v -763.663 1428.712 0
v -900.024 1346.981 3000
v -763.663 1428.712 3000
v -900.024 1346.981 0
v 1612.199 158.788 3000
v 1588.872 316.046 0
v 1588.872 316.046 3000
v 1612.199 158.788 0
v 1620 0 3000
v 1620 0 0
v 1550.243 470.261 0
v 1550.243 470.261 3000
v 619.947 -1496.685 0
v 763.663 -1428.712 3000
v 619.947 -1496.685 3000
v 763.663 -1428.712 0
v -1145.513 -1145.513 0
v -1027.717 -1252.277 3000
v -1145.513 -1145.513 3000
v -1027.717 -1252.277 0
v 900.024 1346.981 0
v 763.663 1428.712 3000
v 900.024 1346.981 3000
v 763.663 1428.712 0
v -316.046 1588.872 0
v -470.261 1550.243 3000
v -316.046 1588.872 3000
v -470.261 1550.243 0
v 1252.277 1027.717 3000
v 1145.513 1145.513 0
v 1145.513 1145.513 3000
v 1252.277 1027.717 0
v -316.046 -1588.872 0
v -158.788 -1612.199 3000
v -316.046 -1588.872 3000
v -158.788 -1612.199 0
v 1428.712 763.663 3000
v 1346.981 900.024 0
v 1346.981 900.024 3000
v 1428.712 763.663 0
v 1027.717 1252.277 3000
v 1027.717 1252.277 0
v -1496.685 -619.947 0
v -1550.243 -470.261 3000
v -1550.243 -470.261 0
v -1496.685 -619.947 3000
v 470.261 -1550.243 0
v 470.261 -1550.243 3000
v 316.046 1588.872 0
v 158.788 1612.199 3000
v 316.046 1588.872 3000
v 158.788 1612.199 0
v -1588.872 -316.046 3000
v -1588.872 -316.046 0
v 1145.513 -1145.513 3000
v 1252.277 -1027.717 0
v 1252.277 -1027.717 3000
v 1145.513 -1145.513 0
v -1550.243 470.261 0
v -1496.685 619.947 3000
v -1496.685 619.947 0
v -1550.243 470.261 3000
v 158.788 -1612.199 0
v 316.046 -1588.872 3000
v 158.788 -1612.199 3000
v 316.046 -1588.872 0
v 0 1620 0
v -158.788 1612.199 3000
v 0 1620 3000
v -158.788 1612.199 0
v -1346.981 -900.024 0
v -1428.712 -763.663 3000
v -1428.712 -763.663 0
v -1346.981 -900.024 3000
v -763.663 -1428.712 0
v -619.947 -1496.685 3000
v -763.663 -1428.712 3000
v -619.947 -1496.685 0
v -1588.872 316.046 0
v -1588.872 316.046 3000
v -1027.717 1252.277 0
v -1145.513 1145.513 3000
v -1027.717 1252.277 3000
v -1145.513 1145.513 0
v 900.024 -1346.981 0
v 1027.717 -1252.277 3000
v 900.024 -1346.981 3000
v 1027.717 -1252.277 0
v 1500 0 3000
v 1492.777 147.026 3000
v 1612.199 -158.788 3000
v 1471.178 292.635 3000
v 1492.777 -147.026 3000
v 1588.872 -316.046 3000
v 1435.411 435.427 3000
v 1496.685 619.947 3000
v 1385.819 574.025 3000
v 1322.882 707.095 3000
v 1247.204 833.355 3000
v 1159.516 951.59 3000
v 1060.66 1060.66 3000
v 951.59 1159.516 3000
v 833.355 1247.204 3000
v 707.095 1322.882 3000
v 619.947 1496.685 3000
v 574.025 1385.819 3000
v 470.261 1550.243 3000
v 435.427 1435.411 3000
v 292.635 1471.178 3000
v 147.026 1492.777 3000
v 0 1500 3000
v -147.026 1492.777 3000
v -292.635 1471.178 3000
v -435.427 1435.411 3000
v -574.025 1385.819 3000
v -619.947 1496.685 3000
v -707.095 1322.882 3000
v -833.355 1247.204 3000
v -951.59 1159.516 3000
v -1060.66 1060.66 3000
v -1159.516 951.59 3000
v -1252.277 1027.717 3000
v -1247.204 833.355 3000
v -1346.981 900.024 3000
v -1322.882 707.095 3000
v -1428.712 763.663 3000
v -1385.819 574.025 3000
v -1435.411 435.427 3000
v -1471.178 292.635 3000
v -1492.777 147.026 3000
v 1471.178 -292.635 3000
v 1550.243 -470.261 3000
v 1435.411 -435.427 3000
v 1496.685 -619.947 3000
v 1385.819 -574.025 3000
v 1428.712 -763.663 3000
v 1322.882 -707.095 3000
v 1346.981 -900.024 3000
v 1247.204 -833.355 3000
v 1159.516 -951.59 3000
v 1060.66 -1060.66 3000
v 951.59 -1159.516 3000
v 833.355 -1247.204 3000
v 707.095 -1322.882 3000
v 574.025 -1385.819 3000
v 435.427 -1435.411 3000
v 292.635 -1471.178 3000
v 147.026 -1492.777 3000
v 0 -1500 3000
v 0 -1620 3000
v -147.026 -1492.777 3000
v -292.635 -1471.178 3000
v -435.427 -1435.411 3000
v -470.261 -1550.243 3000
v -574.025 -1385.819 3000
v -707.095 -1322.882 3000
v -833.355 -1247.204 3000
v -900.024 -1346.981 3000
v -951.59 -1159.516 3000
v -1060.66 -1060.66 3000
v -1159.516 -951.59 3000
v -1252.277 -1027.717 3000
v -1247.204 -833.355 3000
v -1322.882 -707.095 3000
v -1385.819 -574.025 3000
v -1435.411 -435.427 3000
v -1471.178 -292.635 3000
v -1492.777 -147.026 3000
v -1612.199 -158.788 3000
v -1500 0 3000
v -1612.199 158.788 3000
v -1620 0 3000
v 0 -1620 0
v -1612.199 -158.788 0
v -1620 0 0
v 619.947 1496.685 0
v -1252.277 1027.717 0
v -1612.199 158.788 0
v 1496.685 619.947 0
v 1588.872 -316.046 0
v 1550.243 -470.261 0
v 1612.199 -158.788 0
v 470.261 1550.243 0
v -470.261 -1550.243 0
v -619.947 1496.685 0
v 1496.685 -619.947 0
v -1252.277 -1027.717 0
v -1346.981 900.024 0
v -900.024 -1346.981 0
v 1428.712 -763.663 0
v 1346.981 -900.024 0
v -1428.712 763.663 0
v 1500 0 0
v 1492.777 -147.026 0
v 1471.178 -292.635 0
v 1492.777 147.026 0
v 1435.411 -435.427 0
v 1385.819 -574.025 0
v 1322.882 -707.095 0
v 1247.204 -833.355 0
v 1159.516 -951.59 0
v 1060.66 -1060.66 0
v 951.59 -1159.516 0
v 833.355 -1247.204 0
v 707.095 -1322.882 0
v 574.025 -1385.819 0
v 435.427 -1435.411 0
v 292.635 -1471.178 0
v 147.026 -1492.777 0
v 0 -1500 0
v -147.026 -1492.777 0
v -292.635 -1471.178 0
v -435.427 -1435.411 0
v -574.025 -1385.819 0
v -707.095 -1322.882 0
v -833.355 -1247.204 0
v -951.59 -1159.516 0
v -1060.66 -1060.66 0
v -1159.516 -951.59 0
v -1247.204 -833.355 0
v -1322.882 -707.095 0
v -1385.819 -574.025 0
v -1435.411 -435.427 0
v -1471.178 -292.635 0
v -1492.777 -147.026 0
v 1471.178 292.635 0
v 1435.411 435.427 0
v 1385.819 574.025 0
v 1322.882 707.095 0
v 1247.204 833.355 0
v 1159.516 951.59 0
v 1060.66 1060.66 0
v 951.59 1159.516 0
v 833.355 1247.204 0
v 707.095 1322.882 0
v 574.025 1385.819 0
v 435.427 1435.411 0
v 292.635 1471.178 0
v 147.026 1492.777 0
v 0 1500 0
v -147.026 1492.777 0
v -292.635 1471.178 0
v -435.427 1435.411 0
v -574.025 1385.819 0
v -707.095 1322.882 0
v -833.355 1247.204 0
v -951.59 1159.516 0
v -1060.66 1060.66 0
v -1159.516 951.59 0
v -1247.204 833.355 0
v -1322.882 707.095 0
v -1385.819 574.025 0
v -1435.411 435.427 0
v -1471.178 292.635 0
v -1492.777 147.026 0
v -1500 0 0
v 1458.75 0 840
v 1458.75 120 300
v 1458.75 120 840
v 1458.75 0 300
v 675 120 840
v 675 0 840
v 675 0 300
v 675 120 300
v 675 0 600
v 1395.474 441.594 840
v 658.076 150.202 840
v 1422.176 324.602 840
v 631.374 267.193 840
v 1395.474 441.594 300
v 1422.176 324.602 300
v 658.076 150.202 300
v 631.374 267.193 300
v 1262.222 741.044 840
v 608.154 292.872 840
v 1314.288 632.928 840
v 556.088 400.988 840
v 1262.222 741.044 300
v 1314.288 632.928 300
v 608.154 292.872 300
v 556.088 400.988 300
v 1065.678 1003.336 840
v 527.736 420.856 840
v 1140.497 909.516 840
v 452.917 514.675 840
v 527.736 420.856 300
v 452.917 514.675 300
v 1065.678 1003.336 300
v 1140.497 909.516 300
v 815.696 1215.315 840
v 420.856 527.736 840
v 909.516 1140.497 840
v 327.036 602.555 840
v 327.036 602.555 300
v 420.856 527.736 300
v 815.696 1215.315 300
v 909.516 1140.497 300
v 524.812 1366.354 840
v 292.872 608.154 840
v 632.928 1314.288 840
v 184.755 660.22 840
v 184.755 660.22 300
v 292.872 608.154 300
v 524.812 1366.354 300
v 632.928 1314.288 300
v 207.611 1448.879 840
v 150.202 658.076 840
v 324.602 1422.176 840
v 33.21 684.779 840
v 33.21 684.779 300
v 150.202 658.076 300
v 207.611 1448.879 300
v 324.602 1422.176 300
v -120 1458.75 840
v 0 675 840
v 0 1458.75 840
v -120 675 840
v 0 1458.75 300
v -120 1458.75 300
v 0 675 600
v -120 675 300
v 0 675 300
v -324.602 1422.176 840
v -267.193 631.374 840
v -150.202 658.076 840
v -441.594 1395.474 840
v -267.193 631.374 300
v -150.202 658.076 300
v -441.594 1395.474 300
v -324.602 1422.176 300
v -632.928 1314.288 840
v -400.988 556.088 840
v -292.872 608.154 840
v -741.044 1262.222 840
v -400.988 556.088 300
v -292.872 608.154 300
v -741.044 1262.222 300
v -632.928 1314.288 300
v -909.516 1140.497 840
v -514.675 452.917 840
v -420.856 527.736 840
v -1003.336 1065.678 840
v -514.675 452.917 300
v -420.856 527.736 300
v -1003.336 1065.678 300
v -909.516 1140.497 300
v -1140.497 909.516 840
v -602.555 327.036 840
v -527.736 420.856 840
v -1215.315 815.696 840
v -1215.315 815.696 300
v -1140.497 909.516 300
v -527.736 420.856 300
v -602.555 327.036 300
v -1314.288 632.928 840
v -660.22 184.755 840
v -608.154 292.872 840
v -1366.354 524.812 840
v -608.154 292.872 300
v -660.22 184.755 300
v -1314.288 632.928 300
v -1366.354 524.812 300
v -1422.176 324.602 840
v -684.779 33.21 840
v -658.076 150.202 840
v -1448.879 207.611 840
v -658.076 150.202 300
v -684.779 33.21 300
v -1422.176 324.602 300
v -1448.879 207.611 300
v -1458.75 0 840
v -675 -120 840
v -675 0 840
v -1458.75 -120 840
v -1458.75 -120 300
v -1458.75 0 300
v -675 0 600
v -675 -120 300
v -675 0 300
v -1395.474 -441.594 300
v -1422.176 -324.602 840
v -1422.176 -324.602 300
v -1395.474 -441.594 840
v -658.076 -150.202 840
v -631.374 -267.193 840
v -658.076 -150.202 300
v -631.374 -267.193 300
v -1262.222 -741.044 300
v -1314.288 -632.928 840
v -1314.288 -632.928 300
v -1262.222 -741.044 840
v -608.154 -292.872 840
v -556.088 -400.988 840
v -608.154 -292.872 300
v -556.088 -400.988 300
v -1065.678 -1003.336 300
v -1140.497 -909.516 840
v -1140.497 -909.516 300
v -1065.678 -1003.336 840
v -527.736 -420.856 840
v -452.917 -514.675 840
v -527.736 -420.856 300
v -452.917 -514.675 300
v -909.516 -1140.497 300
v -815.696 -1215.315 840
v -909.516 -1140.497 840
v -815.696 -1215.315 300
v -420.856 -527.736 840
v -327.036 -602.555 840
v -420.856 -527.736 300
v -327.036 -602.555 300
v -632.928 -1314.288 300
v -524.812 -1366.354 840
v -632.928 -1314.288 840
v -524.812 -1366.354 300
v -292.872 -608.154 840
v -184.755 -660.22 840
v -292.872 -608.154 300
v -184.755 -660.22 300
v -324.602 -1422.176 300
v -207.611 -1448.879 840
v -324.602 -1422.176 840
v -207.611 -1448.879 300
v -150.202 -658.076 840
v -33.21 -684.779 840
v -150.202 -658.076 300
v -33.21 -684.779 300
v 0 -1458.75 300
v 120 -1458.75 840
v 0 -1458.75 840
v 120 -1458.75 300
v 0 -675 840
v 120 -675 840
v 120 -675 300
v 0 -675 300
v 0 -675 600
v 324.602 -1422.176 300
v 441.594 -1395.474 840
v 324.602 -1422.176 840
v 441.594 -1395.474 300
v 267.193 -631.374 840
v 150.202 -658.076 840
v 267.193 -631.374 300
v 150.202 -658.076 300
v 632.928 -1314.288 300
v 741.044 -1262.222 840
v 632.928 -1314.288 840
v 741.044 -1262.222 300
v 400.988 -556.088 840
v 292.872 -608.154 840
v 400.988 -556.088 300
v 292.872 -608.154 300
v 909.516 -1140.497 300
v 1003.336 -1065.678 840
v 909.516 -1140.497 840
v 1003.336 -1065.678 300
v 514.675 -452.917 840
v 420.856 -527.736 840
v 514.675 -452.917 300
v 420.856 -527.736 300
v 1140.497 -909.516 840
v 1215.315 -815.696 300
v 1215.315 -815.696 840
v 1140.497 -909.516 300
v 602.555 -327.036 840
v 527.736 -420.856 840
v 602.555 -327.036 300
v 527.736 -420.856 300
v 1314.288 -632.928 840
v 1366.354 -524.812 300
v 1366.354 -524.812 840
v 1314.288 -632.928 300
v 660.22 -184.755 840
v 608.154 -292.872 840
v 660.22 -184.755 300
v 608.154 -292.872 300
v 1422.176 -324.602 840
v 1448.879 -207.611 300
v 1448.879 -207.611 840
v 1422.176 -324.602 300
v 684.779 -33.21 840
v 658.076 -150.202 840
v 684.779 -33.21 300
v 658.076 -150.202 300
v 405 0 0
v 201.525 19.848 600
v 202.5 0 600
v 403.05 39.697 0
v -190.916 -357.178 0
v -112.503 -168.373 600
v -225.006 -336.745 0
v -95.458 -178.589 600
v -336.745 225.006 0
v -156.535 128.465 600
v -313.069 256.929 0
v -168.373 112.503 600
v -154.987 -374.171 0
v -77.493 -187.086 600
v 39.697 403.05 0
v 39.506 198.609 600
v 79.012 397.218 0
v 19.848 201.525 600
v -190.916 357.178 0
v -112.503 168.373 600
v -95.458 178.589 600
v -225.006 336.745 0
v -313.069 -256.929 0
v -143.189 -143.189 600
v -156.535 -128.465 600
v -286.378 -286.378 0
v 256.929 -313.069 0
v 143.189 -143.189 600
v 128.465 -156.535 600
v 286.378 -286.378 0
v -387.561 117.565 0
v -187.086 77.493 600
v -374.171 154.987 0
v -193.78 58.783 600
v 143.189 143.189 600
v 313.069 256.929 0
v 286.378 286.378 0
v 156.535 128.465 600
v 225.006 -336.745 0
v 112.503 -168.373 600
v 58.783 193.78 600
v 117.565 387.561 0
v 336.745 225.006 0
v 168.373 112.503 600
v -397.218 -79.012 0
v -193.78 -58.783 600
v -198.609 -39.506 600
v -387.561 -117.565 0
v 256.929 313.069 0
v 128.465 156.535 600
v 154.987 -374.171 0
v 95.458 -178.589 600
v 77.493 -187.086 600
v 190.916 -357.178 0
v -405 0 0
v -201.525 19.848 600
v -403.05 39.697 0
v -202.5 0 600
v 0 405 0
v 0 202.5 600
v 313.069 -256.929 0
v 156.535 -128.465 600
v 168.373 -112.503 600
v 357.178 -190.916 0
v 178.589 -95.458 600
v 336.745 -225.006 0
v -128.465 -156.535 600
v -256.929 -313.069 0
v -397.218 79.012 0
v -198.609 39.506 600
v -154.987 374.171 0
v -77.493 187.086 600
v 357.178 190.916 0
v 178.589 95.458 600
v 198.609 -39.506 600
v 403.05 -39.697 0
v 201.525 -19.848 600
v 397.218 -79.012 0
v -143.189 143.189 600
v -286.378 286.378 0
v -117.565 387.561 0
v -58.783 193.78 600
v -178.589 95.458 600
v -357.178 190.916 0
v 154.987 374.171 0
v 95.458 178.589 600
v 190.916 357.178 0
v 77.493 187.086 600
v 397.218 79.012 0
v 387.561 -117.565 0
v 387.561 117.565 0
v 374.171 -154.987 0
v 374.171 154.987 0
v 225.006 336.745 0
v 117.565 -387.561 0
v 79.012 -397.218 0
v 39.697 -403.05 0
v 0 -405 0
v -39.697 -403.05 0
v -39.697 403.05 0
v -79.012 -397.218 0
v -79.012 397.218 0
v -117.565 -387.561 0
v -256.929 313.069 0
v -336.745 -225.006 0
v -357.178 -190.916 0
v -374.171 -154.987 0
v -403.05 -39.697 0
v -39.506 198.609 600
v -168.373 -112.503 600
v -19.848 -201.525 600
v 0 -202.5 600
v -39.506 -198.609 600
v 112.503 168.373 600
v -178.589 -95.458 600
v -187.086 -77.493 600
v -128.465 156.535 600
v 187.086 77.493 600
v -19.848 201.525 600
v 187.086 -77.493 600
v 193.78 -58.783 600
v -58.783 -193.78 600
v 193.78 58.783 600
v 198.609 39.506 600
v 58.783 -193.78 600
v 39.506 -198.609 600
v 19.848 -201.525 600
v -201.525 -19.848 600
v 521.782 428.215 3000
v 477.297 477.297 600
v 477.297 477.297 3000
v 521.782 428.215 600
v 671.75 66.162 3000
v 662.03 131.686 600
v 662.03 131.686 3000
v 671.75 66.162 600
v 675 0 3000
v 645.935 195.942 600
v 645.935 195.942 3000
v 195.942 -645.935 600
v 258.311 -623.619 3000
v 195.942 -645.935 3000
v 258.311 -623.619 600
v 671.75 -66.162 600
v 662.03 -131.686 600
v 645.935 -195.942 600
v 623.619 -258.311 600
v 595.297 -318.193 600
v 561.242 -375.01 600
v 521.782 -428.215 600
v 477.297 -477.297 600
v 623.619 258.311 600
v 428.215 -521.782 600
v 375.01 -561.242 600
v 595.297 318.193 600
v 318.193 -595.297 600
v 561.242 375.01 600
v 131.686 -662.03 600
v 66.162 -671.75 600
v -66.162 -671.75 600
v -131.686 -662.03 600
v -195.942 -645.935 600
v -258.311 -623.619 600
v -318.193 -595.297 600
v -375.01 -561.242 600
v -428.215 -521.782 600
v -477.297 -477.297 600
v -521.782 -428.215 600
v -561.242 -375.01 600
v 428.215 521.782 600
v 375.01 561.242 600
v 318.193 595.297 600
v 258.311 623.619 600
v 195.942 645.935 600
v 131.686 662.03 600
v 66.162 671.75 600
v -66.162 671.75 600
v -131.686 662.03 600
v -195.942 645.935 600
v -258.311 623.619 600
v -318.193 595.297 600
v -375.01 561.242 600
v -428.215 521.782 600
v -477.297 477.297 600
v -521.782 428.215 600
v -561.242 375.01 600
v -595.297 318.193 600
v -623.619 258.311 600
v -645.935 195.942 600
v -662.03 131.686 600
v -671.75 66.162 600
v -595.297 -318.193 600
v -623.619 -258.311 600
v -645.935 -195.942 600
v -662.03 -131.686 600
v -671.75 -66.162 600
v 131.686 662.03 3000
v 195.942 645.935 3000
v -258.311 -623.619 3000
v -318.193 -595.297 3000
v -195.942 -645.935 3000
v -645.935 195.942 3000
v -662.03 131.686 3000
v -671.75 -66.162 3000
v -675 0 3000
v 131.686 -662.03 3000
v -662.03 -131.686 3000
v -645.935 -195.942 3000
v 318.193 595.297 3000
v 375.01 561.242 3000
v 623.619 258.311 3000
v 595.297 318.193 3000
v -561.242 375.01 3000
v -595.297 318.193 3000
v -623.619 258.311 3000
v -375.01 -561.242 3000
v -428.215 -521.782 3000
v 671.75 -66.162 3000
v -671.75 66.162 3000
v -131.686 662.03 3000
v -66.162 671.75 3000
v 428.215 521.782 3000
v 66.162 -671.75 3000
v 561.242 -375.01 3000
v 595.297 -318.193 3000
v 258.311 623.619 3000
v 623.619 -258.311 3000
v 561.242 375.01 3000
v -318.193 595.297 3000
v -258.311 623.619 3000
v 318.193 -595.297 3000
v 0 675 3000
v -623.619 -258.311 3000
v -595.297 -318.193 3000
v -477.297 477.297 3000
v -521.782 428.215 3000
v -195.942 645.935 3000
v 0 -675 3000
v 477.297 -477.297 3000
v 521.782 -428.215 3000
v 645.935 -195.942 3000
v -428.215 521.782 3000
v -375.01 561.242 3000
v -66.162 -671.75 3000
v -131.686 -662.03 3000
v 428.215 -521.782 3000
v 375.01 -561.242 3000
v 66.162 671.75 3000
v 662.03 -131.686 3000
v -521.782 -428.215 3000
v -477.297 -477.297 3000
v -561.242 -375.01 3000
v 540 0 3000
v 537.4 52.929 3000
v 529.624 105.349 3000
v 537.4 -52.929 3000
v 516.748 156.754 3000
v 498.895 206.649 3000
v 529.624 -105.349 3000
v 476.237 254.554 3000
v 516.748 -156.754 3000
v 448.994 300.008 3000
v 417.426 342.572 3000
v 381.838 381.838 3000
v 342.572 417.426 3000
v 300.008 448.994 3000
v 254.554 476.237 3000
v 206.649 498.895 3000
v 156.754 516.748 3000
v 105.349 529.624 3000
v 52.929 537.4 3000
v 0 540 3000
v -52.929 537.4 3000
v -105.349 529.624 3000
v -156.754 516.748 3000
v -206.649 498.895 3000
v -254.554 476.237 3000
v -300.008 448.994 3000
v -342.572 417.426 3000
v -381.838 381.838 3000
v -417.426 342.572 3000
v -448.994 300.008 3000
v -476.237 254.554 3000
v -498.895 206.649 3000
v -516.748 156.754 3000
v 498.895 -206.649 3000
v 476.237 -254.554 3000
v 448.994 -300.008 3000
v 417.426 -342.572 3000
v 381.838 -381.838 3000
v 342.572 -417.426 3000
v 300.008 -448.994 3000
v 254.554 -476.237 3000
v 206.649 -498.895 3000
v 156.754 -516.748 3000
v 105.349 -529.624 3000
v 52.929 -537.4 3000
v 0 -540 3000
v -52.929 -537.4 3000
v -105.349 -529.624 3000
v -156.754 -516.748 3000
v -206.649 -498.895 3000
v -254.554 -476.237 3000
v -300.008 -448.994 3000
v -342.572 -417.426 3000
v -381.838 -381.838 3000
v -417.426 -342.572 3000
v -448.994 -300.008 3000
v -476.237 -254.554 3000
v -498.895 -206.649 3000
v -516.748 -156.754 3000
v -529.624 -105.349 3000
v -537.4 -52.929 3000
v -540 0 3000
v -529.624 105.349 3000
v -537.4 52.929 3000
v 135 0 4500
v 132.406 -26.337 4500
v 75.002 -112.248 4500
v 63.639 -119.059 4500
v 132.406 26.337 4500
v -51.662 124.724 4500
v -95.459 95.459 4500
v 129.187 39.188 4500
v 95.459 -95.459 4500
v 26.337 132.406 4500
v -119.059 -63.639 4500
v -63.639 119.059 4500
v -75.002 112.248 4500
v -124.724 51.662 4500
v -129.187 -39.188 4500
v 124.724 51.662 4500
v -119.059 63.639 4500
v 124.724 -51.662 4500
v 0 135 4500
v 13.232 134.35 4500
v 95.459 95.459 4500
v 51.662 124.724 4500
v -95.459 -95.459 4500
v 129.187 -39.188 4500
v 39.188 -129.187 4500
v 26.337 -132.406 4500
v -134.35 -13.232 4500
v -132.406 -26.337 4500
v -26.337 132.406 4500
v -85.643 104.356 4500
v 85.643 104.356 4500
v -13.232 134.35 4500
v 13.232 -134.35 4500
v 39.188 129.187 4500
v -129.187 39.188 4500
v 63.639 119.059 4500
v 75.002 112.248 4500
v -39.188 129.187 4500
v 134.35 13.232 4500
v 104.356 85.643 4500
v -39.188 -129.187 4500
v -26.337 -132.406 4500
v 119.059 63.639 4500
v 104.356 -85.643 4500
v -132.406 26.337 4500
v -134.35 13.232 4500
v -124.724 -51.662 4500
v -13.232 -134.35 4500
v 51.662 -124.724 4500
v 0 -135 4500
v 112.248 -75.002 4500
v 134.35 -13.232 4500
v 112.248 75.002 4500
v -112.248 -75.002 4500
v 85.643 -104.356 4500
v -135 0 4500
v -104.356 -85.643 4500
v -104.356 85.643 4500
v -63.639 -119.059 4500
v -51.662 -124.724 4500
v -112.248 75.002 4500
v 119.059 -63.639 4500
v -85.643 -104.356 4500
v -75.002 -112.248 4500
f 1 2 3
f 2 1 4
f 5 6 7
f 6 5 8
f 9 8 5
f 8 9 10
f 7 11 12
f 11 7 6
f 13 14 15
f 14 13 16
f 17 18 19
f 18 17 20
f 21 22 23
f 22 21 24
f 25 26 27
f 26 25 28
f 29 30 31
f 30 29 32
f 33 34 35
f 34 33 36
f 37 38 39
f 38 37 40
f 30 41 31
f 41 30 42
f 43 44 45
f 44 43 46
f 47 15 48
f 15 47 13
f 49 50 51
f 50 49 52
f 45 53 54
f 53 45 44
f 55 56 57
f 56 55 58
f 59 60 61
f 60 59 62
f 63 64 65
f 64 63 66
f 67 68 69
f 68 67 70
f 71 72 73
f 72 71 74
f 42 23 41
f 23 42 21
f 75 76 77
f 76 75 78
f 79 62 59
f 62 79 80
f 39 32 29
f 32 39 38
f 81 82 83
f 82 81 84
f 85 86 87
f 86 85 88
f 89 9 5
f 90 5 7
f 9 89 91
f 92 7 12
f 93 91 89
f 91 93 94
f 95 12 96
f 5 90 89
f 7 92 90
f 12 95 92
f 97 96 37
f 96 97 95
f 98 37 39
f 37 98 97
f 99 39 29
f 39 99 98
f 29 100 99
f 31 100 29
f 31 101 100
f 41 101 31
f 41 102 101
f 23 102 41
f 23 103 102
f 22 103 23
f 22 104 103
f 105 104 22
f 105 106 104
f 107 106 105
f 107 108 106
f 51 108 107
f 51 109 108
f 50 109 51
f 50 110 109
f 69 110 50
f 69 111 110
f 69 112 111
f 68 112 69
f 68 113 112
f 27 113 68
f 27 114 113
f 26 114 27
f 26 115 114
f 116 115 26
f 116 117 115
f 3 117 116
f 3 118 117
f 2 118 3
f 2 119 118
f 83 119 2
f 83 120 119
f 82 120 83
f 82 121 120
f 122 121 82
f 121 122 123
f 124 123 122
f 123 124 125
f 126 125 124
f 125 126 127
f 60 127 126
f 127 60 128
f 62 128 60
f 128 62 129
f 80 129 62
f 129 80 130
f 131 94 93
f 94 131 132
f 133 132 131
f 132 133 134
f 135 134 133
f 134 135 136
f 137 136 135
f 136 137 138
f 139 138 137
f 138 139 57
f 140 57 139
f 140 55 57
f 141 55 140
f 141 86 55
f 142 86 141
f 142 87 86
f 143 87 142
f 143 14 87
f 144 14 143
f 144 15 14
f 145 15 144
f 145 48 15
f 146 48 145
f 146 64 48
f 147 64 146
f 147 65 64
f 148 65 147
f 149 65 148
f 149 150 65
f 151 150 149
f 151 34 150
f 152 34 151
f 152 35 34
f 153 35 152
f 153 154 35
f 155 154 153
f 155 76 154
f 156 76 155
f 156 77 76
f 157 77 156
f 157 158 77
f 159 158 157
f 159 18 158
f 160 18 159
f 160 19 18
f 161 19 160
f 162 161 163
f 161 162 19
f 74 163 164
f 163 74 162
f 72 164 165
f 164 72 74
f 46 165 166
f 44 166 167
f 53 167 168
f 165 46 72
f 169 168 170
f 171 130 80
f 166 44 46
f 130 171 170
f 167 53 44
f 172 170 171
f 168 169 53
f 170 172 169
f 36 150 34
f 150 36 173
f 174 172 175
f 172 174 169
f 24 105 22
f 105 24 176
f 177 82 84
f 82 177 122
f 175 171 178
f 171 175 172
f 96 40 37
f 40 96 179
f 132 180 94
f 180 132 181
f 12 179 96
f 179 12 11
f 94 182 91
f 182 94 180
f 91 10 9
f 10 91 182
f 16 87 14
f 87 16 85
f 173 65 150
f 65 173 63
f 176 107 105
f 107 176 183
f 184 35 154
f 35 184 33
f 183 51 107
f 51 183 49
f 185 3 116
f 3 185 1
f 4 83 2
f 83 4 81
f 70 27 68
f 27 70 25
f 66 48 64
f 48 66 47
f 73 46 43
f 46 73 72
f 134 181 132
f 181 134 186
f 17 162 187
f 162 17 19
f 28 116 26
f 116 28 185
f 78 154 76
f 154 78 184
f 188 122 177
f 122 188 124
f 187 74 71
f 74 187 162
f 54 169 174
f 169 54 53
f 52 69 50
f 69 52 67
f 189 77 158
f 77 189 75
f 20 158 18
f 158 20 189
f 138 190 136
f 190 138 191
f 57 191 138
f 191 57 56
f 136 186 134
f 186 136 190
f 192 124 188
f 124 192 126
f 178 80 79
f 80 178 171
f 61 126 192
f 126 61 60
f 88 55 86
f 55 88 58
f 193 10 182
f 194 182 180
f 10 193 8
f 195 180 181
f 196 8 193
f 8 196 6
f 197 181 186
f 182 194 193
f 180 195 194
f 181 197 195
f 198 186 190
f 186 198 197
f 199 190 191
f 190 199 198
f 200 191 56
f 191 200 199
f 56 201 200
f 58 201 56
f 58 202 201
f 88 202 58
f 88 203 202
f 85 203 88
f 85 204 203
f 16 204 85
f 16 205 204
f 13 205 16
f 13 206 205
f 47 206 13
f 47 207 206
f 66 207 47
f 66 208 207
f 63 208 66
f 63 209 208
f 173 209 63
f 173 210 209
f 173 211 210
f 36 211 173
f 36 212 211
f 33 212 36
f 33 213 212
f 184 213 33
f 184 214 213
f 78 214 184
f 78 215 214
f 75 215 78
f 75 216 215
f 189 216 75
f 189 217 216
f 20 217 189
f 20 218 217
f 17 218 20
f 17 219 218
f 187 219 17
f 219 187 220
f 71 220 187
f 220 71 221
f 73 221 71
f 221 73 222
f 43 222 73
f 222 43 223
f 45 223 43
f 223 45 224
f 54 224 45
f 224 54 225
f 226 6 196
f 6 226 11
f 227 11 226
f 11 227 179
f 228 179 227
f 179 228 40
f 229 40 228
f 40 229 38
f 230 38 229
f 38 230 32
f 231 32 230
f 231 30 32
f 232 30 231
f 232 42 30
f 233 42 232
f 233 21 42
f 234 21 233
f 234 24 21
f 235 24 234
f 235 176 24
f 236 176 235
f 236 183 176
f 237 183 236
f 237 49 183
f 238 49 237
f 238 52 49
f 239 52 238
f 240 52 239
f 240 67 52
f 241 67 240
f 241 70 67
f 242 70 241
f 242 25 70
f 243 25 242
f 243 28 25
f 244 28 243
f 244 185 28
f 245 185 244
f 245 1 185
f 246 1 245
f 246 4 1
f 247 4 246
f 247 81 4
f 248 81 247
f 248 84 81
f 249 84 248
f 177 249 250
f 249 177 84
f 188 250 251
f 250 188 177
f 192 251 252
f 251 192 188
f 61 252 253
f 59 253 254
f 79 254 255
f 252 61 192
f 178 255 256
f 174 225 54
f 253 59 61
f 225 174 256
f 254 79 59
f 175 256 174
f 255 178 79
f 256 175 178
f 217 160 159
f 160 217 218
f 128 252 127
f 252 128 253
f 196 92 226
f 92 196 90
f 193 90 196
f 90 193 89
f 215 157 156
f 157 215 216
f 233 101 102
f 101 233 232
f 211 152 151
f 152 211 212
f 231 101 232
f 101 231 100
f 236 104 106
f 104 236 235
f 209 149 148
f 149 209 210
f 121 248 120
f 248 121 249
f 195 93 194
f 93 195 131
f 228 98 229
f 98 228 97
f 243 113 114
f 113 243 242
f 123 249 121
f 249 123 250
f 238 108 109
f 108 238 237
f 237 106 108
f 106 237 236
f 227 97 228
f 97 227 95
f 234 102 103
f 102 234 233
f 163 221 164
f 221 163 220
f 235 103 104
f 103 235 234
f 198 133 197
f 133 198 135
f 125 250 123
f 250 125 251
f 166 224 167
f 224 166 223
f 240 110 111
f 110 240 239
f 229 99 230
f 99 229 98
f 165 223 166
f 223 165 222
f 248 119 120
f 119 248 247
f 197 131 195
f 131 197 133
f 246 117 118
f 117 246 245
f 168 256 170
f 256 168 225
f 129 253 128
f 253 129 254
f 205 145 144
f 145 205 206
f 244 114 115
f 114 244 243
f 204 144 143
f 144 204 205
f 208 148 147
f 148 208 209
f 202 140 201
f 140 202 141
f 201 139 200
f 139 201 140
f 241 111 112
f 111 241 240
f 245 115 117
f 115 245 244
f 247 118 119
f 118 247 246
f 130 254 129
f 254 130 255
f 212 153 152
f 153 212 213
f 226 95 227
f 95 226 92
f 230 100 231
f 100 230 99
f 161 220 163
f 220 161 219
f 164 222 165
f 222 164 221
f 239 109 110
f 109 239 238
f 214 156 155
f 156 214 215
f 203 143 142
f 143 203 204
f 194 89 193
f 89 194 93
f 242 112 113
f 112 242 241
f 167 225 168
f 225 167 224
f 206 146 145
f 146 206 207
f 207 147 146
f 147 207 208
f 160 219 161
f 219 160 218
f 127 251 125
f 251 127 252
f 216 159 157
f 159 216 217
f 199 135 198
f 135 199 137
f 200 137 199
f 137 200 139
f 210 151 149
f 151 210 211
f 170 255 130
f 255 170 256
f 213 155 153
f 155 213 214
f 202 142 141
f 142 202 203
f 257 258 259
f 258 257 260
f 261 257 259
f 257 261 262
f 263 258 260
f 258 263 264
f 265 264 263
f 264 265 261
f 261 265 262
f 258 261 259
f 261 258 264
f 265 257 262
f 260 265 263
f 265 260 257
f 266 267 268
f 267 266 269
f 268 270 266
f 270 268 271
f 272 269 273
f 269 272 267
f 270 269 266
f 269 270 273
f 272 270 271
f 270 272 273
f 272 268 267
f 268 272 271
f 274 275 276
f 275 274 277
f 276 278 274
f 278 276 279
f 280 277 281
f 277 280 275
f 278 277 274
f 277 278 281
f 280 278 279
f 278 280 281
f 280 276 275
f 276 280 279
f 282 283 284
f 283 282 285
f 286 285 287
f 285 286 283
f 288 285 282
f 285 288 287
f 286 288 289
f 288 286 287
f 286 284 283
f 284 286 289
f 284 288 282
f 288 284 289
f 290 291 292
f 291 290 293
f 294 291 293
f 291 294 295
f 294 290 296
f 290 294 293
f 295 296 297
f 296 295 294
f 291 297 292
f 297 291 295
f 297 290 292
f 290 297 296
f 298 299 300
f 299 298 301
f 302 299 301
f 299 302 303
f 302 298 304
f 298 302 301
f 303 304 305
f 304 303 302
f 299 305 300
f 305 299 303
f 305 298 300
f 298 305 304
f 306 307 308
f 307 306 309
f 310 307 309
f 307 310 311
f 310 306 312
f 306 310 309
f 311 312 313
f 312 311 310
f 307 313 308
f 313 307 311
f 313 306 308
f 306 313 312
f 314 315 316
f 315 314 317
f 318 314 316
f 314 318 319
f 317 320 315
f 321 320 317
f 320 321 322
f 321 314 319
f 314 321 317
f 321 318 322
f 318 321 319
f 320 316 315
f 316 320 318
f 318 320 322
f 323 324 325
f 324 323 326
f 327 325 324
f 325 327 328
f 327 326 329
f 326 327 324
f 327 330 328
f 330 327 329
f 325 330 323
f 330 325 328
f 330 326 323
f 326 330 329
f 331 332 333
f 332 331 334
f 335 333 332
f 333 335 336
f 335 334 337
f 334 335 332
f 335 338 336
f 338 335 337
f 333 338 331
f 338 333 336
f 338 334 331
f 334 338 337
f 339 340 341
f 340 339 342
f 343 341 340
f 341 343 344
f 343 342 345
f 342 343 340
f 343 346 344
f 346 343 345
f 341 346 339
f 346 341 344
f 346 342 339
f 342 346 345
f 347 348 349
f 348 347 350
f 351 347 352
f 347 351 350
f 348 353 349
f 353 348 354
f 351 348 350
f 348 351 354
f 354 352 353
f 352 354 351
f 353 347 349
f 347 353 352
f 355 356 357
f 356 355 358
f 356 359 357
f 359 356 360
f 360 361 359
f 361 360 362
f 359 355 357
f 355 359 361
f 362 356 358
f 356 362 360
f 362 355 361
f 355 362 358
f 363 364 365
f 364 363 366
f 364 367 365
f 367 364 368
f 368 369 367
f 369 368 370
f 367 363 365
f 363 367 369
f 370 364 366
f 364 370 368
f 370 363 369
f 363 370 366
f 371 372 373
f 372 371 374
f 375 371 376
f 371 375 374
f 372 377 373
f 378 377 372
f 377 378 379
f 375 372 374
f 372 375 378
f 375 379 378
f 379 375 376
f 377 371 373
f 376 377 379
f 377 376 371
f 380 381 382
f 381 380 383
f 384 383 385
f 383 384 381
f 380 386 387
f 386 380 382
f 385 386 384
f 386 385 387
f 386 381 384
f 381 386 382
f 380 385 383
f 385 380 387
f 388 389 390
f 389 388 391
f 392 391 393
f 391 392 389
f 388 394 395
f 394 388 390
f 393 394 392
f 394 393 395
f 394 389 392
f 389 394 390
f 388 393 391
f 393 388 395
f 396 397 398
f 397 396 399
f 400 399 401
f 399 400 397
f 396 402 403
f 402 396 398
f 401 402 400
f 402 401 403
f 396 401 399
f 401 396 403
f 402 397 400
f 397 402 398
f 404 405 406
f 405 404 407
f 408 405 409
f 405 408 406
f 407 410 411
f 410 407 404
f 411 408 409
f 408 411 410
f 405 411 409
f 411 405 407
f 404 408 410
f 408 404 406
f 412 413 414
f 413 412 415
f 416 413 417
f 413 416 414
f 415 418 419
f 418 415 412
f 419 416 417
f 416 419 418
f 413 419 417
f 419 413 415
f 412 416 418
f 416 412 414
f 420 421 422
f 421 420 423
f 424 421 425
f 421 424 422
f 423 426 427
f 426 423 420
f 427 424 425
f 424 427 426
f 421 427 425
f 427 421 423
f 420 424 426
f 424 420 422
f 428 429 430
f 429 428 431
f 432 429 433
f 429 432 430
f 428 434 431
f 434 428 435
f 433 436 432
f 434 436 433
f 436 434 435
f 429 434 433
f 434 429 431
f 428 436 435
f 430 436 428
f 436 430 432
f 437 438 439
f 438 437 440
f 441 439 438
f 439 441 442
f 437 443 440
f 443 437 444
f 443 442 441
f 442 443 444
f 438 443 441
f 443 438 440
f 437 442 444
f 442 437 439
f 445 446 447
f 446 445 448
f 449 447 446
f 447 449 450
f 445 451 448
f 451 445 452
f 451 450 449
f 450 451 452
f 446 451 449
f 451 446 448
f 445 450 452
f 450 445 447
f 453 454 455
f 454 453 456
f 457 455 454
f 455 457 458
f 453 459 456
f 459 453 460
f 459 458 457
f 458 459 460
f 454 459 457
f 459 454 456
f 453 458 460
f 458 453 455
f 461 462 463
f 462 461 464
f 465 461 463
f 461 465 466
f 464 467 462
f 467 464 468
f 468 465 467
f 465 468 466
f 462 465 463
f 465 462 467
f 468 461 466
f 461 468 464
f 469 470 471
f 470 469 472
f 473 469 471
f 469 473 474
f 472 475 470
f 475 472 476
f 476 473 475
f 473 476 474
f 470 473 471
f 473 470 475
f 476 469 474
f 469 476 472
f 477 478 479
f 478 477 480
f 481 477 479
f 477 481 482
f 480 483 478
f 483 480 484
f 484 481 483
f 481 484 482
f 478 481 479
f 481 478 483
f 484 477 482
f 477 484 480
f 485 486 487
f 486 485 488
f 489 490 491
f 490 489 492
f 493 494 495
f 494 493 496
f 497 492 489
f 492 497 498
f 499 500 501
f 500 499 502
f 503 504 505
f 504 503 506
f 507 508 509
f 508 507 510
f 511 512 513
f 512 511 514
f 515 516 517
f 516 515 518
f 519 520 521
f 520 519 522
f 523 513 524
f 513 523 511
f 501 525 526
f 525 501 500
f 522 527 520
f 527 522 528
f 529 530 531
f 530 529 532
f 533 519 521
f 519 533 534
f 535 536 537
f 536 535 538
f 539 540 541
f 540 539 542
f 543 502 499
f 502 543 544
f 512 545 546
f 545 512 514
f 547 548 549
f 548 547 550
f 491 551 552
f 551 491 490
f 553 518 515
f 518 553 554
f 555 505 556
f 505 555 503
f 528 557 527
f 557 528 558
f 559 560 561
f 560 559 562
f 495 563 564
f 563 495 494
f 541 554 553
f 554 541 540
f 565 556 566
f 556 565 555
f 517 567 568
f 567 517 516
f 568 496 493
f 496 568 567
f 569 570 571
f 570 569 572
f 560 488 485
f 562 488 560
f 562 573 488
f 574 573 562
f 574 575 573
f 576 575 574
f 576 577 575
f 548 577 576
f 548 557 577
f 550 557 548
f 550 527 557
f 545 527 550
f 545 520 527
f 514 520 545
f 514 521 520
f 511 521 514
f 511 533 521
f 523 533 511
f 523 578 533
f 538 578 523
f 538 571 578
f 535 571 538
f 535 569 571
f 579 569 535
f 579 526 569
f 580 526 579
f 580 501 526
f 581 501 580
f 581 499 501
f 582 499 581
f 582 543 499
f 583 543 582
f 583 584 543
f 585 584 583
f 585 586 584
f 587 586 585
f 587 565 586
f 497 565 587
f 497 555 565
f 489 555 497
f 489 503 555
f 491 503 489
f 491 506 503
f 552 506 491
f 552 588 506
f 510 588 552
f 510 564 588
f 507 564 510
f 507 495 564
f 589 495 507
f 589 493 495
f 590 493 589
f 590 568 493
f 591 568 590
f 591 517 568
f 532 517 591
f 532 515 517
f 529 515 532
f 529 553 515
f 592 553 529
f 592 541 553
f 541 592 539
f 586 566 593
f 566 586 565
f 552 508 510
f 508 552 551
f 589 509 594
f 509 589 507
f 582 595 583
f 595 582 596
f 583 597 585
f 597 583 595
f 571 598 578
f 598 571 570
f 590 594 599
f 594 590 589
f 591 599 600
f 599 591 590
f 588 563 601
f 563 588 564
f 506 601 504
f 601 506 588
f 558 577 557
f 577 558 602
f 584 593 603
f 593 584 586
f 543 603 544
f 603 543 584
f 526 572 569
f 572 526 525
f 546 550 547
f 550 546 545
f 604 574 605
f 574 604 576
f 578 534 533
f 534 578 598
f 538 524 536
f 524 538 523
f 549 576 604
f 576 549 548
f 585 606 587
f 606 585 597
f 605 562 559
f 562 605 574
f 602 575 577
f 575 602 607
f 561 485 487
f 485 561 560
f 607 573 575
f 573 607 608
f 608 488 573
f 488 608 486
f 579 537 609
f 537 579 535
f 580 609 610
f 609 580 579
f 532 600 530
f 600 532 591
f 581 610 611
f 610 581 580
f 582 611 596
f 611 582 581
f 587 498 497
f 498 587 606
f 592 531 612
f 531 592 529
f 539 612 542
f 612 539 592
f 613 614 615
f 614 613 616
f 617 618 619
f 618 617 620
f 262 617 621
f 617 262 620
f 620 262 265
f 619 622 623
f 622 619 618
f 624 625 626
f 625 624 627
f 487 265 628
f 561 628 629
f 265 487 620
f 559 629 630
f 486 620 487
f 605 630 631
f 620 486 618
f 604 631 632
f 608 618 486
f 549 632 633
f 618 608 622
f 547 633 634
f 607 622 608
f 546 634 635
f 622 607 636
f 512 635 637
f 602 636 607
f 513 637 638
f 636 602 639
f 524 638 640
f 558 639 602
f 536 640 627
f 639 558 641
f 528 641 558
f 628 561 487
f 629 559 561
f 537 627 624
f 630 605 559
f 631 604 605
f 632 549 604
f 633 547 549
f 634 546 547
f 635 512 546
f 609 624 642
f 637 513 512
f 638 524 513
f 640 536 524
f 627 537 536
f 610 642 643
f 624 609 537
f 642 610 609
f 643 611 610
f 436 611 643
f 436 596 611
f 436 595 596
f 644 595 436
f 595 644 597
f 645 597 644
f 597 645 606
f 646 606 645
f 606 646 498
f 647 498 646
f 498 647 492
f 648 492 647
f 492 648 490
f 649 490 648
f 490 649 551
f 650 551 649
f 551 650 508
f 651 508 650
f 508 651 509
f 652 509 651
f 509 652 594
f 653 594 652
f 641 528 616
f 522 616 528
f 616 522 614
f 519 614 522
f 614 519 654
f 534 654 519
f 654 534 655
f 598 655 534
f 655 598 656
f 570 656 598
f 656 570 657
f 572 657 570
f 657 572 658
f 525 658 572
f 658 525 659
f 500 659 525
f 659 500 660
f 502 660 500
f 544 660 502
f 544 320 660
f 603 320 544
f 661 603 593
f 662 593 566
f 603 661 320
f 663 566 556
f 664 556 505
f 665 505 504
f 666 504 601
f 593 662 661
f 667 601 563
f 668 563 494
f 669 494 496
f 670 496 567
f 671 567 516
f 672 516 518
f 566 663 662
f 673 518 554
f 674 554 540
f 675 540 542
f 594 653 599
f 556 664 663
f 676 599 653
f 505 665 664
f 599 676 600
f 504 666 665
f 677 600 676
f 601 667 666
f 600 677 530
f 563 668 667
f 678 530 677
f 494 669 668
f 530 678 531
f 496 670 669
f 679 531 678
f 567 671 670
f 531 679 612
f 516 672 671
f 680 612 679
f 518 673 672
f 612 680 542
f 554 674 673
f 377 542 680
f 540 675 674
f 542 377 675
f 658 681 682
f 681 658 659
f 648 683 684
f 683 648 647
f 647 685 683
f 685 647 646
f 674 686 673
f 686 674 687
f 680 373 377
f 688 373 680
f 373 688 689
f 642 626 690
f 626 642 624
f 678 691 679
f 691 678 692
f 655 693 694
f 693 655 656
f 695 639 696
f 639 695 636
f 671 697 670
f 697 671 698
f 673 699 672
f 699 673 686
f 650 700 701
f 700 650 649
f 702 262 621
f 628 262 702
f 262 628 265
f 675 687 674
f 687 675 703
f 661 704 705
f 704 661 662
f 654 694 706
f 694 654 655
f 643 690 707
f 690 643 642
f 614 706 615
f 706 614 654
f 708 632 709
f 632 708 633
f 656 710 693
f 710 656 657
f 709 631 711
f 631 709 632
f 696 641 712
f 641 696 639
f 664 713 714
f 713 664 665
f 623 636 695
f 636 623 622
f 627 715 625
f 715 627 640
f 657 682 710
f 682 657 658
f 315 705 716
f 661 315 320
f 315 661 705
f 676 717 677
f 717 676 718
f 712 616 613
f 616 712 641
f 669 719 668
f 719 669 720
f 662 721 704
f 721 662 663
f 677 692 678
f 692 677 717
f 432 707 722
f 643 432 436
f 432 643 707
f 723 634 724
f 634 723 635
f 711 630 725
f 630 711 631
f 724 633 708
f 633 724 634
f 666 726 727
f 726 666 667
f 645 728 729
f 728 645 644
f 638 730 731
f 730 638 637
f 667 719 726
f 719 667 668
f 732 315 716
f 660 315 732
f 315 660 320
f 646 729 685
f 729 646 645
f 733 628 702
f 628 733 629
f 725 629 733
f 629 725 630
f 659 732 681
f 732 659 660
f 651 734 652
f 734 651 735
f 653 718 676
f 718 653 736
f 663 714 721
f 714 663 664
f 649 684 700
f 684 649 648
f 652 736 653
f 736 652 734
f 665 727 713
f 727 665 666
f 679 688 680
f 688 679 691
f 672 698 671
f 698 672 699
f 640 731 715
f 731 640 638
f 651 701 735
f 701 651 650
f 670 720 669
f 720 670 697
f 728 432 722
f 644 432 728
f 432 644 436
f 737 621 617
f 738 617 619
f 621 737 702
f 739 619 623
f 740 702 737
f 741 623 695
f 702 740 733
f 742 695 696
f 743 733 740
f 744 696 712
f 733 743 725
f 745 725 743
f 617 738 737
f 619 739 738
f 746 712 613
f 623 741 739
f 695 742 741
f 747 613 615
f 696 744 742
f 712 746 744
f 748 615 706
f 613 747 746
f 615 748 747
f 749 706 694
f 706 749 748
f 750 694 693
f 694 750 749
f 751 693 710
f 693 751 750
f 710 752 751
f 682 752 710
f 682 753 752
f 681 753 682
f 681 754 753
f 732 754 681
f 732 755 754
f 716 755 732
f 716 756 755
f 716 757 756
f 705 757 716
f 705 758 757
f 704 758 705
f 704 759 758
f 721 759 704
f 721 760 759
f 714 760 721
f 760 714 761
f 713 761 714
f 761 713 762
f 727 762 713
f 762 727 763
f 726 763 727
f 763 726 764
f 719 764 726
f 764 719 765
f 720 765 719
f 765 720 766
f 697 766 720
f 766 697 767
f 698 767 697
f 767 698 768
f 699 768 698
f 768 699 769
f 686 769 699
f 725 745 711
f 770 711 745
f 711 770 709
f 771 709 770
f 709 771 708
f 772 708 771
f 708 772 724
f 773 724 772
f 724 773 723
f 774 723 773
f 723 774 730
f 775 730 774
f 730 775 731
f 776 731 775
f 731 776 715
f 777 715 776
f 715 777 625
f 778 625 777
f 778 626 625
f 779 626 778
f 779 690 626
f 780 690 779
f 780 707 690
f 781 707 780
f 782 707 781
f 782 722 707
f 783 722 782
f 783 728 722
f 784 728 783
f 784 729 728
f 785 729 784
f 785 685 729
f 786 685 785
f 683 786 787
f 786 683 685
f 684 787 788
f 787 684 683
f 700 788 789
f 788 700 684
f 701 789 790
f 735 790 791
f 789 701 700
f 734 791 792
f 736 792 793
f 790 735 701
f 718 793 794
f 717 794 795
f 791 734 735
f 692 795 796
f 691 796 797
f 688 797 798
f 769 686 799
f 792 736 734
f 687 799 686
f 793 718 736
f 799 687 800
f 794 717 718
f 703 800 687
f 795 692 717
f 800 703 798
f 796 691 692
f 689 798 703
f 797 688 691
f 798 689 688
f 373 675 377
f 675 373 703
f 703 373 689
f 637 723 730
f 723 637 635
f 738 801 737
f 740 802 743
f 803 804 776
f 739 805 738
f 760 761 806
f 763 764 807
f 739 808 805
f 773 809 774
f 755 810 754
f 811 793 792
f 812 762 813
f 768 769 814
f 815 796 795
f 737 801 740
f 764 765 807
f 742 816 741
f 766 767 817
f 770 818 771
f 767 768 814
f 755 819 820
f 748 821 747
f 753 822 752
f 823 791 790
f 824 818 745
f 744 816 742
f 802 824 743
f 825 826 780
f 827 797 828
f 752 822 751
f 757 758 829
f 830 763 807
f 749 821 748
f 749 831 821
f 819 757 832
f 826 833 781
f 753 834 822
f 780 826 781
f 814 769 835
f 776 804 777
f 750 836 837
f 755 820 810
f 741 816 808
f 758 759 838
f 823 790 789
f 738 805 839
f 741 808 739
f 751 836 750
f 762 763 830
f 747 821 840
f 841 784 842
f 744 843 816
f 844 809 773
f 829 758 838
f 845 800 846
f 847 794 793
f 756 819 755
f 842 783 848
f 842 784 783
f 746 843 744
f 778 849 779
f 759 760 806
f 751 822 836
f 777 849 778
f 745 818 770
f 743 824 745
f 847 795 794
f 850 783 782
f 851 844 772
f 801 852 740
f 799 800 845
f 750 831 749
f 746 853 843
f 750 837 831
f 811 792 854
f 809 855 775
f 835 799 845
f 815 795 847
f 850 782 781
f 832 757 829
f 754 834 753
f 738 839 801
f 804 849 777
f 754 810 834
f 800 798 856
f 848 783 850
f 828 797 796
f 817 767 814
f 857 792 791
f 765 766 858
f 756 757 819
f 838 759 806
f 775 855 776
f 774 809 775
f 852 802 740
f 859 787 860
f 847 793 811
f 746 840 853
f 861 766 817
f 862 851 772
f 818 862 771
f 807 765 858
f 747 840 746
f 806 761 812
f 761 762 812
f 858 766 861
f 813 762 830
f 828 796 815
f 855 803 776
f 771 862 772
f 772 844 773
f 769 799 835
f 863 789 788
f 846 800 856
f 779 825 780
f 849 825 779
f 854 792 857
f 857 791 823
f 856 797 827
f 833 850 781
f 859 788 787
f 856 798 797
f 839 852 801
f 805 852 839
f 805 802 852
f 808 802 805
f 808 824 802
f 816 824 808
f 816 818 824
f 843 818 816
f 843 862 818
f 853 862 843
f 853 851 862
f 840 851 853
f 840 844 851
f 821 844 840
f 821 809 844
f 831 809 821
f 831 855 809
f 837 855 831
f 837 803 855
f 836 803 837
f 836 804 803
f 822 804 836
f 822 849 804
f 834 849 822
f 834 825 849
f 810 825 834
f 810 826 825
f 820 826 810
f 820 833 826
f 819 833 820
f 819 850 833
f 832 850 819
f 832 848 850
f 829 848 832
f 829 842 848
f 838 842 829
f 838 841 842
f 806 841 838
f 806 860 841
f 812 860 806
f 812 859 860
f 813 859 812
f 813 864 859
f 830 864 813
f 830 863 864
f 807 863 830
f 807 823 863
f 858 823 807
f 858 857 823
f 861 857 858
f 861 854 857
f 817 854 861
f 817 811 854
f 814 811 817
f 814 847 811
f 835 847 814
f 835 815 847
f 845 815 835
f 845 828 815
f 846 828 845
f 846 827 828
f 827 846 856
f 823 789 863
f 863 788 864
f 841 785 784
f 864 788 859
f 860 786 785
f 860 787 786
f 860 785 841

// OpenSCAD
// Generated by Text-to-CAD from prompt:
// a turbofan jet engine 3 m long with 28 blades
$fn = 64;

module JetEngine() {
difference() {
    cylinder(h=3000, r=1620, $fn=$fn);
    cylinder(h=3000, r=1500, $fn=$fn);
}
cylinder(h=1200, r1=405, r2=0, $fn=$fn);
for (i = [0 : 27]) rotate([0, 0, 360.0 / 28 * i]) {
    translate([675, 0, 300]) {
        cube([783.75, 120, 540]);
    }
}
    translate([0, 0, 600]) {
    cylinder(h=2400, r=675, $fn=$fn);
    }
    translate([0, 0, 3000]) {
    cylinder(h=1500, r1=540, r2=135, $fn=$fn);
    }
}

JetEngine();
